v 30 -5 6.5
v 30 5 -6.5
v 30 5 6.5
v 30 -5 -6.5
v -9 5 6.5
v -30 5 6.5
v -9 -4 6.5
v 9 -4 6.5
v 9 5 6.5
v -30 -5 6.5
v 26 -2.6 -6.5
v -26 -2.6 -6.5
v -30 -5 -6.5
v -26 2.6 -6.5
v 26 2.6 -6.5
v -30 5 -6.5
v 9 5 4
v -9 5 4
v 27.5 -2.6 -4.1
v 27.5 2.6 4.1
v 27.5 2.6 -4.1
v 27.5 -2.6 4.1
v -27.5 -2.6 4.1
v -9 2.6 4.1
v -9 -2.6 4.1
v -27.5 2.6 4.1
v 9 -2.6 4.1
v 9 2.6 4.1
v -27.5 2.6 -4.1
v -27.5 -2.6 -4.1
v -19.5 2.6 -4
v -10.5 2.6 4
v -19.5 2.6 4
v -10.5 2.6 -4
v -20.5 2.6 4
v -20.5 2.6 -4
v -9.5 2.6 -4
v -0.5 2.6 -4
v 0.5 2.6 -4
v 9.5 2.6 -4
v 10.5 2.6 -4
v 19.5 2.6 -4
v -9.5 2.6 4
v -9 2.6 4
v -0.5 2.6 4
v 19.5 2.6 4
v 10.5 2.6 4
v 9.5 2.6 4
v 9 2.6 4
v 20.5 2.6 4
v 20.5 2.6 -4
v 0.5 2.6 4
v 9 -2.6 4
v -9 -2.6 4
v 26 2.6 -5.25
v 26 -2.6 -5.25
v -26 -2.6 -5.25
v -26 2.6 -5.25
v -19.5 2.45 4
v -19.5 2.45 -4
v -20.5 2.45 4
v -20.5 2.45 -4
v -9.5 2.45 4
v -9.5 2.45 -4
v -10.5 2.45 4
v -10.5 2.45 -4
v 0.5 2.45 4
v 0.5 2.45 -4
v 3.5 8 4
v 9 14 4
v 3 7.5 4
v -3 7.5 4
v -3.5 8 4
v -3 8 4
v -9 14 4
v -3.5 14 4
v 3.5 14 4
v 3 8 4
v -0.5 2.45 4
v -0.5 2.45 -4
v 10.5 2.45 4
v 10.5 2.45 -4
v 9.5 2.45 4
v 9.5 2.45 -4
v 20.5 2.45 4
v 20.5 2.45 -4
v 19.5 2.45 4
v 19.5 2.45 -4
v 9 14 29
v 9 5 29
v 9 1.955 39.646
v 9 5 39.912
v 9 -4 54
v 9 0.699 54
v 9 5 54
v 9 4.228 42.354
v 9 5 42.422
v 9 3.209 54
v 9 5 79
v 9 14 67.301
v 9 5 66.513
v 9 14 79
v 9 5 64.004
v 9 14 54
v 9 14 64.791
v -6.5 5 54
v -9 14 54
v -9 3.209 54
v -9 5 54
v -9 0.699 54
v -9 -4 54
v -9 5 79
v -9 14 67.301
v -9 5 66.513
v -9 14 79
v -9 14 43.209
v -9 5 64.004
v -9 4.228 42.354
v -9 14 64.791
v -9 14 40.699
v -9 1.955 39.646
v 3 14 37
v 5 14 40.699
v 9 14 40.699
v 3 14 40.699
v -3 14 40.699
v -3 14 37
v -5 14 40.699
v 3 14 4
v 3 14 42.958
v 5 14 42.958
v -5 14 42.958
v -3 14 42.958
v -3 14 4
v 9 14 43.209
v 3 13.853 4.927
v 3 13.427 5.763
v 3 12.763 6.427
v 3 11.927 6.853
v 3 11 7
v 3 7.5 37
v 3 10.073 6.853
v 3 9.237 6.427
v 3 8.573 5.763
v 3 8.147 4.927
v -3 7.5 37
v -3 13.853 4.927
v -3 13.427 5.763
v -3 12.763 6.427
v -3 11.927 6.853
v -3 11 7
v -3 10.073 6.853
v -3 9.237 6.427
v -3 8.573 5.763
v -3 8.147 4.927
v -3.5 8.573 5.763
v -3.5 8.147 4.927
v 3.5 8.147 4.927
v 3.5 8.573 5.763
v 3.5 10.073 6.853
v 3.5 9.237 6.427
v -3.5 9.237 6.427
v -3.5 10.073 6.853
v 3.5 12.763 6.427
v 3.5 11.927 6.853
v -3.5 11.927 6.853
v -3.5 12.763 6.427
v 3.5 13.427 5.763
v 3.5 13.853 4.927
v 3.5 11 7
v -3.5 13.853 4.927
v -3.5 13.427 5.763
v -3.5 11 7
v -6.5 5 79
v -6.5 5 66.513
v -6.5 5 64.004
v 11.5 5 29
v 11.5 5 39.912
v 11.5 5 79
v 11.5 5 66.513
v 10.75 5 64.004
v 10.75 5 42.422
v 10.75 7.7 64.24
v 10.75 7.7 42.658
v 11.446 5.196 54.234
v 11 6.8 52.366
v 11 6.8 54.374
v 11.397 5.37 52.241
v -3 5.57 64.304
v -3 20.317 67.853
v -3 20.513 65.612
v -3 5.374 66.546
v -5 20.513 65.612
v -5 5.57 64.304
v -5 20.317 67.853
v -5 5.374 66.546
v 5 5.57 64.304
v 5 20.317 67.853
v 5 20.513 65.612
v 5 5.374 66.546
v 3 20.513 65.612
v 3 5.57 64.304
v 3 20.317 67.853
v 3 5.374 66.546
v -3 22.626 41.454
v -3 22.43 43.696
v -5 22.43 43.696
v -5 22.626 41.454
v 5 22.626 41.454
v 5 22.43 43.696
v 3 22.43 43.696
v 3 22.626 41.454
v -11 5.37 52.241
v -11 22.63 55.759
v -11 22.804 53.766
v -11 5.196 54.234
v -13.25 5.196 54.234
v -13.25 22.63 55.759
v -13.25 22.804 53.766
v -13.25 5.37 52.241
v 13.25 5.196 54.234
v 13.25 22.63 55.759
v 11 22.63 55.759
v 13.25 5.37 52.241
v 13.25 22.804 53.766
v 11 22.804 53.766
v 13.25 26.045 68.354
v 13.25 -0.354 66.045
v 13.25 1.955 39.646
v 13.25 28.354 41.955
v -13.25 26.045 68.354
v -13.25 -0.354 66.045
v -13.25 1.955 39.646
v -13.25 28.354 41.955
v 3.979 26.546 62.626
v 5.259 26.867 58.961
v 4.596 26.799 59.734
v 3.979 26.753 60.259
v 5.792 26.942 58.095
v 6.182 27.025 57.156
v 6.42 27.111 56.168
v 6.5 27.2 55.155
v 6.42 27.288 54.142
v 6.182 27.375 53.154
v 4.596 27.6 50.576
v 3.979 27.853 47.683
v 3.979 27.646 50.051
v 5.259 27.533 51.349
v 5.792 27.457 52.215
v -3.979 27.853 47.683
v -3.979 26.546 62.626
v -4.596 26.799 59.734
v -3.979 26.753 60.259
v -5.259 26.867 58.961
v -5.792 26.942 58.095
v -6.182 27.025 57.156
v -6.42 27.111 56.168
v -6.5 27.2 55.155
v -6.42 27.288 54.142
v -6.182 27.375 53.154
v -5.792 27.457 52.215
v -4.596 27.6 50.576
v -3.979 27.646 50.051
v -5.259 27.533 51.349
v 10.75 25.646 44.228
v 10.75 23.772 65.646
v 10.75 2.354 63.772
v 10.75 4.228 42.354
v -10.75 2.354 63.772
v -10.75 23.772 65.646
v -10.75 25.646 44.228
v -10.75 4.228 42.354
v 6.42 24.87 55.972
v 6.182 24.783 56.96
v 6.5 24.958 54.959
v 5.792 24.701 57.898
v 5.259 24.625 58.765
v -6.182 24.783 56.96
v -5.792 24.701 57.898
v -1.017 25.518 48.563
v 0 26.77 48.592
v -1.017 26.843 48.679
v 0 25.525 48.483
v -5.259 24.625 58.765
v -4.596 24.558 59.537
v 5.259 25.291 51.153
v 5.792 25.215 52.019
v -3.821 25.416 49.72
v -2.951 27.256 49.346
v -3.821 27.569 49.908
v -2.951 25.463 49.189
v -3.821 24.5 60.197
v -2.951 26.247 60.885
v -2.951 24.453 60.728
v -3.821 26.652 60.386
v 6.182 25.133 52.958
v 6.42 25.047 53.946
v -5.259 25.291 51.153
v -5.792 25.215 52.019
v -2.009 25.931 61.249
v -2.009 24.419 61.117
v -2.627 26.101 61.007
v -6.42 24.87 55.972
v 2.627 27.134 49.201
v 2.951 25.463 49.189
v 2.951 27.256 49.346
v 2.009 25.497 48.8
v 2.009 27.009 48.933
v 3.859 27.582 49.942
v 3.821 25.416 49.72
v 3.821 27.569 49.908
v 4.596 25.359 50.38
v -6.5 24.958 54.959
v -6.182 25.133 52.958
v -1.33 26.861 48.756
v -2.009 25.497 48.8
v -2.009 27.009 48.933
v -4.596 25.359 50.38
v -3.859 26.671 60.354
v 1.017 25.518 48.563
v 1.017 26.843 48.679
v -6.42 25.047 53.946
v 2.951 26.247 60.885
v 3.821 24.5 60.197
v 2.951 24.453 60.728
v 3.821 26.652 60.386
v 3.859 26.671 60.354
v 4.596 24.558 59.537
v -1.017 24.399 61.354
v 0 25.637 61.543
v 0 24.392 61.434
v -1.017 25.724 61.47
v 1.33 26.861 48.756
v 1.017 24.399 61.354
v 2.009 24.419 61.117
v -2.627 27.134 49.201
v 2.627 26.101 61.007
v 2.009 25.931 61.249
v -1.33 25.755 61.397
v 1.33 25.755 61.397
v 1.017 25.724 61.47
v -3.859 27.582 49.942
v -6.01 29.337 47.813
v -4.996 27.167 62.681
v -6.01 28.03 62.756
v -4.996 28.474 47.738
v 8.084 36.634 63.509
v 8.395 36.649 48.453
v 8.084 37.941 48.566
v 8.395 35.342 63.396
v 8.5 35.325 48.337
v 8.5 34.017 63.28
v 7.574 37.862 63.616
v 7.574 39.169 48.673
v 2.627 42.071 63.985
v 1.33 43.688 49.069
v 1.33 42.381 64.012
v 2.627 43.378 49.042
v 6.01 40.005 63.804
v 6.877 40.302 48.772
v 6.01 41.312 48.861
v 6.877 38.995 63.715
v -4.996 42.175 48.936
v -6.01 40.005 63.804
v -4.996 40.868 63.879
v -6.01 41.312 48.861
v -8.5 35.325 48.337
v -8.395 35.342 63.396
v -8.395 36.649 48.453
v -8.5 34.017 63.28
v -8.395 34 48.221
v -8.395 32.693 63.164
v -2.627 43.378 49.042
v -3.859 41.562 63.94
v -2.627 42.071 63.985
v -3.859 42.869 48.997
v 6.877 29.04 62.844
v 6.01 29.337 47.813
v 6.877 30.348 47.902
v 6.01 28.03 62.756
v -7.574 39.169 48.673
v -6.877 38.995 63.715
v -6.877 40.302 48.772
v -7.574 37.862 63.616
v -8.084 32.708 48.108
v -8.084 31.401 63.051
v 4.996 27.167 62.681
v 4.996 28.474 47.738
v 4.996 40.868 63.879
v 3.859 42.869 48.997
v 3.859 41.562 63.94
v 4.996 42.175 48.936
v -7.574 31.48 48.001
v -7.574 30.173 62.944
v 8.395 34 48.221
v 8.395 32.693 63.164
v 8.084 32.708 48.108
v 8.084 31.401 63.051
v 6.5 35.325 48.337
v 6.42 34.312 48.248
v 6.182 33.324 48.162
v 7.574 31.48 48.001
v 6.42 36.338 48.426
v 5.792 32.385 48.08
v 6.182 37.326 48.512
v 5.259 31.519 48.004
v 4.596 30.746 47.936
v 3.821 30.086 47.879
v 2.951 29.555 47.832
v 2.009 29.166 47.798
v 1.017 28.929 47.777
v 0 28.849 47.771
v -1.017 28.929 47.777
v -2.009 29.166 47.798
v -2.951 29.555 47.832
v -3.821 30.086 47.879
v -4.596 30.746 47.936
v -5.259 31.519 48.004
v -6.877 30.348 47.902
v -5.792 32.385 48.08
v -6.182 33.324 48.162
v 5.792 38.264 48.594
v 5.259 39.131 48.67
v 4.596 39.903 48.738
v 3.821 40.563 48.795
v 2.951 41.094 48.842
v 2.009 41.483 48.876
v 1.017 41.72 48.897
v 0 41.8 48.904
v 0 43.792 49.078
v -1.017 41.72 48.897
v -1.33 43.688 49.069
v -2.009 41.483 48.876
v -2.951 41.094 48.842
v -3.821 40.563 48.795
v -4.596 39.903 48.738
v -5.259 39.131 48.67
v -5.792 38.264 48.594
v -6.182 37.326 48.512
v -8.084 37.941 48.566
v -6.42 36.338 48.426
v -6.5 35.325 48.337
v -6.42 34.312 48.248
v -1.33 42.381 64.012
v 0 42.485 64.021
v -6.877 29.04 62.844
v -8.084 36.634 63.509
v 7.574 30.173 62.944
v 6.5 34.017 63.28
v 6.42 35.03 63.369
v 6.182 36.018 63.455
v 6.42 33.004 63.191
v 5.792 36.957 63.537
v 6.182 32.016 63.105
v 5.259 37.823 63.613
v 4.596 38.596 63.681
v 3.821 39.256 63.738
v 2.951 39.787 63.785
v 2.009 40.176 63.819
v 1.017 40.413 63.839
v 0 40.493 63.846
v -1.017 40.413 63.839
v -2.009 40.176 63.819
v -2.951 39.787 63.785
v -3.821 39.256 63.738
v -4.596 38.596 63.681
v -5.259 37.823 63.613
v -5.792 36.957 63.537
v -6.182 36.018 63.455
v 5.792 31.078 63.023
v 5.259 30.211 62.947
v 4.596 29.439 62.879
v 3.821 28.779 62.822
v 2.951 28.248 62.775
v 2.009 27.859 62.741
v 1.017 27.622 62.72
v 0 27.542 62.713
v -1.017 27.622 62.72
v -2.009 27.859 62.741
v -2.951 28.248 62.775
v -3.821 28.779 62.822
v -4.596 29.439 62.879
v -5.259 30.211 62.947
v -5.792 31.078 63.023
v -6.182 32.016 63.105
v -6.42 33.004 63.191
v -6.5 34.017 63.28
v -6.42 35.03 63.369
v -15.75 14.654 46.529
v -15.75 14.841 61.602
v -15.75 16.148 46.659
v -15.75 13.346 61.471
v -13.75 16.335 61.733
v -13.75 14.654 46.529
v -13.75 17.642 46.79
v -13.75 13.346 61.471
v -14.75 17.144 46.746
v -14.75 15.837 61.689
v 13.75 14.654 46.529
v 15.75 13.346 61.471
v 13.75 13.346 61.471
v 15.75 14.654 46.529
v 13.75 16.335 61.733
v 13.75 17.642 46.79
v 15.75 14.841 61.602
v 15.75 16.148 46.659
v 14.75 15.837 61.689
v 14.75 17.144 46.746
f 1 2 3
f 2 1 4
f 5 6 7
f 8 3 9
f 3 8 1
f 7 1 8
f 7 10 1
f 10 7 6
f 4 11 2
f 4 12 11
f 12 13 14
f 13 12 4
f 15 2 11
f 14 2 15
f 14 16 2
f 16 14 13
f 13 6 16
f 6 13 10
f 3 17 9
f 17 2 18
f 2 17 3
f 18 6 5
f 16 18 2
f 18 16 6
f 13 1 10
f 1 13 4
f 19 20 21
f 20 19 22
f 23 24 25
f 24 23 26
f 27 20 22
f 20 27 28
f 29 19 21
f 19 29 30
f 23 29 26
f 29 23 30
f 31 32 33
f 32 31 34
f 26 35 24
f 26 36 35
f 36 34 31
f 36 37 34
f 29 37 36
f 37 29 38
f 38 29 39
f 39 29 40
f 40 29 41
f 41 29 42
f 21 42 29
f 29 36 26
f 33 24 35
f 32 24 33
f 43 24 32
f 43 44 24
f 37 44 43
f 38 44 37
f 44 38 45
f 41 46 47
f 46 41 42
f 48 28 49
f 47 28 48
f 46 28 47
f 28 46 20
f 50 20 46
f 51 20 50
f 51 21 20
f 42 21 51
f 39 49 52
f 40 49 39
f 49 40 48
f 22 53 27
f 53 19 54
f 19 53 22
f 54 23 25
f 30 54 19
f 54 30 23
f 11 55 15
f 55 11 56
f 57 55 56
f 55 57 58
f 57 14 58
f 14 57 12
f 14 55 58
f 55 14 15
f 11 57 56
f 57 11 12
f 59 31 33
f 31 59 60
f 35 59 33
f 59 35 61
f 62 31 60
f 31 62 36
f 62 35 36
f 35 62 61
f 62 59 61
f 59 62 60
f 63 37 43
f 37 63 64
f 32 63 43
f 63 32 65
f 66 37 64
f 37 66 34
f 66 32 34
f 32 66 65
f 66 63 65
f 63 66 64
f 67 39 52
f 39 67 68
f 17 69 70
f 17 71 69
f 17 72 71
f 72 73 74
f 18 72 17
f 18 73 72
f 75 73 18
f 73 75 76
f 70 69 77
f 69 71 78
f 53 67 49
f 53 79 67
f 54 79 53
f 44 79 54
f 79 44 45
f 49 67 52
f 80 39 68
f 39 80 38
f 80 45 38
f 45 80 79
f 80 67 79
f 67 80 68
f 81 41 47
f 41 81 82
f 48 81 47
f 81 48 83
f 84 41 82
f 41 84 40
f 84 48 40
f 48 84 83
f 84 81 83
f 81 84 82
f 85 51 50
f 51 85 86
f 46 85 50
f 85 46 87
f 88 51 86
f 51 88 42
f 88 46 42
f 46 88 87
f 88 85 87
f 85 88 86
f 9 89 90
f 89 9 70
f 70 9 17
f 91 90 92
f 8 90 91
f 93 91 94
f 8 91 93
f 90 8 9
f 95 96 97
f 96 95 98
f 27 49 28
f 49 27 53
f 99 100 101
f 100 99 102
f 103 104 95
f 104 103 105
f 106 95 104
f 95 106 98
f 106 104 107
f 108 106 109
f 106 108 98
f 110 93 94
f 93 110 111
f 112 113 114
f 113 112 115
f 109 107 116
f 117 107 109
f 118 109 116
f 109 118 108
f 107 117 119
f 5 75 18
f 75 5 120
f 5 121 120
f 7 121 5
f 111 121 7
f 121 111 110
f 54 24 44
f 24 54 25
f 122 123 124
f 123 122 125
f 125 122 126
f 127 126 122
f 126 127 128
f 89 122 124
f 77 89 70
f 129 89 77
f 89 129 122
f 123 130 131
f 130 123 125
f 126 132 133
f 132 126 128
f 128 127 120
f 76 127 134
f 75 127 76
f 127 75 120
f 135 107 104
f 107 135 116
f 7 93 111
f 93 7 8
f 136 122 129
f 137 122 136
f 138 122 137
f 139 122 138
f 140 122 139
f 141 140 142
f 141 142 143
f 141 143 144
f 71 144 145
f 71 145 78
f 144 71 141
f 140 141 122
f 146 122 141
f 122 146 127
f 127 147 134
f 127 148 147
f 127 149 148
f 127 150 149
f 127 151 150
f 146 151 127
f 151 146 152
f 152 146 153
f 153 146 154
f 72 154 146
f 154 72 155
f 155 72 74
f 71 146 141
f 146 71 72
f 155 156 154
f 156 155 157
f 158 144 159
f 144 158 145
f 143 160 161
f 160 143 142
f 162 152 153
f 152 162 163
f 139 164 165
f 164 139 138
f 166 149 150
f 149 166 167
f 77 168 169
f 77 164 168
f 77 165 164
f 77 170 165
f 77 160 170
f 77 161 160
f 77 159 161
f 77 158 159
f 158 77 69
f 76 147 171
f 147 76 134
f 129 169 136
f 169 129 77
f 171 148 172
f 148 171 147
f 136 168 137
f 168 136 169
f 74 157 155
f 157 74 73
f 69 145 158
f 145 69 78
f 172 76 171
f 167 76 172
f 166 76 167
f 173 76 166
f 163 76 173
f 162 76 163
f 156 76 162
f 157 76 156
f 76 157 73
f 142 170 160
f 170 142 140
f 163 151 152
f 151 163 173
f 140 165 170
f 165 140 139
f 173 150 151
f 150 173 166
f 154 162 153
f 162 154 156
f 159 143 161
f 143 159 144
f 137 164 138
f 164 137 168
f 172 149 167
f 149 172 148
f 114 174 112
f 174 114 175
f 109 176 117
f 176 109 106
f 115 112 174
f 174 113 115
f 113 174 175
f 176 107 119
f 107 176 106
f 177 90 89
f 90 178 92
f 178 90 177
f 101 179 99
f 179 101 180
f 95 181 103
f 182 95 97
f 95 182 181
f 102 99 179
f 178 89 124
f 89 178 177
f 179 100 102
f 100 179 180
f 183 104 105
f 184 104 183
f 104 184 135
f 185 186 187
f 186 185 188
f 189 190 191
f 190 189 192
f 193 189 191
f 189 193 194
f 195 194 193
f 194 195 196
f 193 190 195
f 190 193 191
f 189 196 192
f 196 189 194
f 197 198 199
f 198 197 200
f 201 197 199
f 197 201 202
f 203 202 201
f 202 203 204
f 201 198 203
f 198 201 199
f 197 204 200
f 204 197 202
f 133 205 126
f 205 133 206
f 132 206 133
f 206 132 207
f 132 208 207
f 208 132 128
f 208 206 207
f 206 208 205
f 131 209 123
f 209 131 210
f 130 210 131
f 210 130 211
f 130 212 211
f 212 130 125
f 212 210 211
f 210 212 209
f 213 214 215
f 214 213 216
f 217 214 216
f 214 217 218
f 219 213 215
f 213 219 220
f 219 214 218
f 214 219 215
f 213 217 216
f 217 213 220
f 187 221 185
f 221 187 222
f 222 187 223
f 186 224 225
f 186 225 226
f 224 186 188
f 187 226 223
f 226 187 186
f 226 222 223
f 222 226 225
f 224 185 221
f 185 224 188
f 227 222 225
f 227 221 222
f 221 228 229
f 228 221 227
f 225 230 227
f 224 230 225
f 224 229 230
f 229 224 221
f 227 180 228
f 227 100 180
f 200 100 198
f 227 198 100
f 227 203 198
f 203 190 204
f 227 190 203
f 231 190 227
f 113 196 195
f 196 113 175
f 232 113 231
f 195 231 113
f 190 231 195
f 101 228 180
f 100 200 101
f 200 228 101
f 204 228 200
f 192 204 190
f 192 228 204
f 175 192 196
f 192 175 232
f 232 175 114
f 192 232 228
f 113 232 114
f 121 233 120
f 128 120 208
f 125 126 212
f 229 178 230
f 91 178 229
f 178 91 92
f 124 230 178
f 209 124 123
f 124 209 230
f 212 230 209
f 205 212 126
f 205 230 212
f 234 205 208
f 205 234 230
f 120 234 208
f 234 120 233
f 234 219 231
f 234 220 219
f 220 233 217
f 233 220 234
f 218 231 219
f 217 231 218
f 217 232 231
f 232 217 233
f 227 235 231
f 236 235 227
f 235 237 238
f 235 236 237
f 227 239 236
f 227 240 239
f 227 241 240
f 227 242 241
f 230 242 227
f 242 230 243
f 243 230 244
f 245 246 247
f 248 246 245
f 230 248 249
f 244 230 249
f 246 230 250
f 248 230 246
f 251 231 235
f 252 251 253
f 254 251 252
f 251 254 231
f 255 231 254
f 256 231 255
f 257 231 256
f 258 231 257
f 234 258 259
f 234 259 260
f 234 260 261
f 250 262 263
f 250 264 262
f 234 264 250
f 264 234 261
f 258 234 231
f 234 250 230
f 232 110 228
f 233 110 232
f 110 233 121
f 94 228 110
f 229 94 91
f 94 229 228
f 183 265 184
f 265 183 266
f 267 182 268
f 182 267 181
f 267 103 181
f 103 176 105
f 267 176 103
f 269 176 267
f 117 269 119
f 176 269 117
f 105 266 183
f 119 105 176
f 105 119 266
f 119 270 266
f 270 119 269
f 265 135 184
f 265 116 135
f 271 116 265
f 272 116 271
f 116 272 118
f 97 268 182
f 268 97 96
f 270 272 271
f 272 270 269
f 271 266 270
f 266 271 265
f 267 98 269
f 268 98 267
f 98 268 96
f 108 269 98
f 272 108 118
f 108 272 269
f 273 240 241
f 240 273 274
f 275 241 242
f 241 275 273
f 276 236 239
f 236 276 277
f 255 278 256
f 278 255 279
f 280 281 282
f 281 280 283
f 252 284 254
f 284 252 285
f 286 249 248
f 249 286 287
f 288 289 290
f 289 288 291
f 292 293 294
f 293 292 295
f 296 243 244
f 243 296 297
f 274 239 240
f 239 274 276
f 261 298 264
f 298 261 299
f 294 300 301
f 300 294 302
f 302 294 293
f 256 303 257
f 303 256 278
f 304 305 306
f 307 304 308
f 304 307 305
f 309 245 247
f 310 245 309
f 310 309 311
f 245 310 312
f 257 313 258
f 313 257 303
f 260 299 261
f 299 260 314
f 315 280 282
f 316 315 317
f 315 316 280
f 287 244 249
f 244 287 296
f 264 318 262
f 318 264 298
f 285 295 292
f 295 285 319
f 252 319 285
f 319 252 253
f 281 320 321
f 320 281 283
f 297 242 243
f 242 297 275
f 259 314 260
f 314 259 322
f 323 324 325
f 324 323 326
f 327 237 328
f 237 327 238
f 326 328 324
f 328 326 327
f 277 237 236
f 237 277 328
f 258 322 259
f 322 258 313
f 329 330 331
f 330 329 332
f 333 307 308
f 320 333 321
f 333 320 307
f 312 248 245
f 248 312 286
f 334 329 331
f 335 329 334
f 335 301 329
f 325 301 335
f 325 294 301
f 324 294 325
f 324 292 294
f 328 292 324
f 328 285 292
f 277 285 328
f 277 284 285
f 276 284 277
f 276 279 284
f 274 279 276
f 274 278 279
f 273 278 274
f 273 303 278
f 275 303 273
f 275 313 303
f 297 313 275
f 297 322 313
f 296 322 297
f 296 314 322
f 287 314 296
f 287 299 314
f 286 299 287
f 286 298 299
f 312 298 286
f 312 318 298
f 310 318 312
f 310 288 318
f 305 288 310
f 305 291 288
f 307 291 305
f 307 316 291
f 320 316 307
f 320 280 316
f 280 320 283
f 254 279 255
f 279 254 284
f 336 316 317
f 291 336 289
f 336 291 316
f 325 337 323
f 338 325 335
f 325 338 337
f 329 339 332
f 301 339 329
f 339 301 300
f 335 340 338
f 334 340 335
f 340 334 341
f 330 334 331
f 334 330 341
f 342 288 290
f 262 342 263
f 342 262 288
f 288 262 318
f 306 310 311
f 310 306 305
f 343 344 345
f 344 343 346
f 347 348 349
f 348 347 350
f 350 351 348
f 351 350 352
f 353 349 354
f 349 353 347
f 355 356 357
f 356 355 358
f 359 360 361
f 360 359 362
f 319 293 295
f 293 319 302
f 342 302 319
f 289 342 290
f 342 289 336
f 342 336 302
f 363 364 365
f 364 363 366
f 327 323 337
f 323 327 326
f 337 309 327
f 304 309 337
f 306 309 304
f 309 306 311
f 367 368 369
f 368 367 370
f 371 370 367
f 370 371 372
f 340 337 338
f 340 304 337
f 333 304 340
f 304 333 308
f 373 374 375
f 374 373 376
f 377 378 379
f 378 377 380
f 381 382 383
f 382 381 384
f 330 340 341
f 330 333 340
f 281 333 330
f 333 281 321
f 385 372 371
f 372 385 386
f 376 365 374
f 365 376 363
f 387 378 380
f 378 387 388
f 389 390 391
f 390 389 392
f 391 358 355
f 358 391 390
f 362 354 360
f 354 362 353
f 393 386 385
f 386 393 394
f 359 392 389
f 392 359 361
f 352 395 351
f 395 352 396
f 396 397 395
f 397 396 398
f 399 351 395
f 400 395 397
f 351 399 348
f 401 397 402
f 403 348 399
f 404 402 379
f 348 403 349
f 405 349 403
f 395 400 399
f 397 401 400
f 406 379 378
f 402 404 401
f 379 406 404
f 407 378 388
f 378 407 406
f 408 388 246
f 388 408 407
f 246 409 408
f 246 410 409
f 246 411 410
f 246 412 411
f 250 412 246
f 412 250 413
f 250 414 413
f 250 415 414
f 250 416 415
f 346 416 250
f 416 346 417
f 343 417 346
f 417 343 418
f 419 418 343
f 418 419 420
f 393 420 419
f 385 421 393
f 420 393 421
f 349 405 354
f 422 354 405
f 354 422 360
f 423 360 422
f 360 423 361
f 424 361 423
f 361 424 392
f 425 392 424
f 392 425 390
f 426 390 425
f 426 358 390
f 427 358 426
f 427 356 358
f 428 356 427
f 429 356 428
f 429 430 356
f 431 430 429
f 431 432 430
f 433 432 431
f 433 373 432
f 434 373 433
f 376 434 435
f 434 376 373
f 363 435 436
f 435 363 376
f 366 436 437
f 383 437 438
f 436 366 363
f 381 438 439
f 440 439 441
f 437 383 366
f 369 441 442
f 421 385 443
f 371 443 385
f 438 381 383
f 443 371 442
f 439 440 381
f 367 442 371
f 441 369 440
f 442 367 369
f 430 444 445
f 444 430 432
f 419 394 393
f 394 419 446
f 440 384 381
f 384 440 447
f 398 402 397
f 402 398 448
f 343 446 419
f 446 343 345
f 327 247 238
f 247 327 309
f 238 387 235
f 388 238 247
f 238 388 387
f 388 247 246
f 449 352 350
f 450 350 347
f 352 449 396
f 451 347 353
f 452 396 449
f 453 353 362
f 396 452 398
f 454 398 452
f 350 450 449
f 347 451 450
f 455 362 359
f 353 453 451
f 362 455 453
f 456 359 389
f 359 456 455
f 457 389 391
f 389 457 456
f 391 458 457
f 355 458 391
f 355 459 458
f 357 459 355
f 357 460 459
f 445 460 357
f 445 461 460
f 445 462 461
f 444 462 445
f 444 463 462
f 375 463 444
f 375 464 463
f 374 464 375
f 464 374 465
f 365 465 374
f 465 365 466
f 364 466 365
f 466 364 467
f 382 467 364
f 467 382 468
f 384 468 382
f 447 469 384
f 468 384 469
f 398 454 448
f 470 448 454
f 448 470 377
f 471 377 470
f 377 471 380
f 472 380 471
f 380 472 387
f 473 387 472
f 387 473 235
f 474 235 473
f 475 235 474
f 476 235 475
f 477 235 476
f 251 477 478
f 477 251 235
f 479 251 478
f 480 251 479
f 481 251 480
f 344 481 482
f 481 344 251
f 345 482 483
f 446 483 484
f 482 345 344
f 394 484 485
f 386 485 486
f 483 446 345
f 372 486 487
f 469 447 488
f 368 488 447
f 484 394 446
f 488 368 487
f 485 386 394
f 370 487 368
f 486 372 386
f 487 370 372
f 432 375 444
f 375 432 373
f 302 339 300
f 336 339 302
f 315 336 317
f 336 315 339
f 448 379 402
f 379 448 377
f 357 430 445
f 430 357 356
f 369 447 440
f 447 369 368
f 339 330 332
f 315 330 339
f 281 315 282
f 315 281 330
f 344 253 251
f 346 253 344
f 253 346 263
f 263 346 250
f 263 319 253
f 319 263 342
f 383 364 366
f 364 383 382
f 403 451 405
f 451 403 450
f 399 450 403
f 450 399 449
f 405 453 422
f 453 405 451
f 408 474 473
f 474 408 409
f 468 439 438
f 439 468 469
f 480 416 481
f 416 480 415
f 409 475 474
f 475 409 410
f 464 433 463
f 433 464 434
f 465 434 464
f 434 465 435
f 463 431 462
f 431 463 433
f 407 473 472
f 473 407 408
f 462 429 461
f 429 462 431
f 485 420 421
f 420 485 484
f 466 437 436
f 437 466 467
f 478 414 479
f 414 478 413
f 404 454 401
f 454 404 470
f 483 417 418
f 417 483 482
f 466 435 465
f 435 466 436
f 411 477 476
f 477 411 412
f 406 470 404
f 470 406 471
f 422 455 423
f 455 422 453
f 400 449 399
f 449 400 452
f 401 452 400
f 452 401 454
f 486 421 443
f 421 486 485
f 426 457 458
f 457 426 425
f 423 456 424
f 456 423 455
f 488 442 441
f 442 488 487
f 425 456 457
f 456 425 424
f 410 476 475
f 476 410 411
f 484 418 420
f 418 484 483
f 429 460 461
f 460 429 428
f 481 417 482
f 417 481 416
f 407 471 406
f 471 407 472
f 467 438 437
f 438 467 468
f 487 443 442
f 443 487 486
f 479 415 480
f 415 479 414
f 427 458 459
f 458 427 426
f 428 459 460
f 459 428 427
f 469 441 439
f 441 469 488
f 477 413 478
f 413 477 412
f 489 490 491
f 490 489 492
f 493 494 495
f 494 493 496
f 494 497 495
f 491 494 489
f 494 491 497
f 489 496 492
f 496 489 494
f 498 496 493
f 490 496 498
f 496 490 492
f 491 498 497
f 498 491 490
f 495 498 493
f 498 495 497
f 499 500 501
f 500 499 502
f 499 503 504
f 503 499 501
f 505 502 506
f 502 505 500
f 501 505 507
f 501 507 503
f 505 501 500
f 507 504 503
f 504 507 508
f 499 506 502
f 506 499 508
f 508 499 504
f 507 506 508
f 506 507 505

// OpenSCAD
/*
 * Google Glass EE2 + FLIR Boson 320 Mount
 * Parametric OpenSCAD design
 * 
 * This design creates a top-mount bracket that attaches to the Glass frame
 * and holds the Boson 320 thermal camera with lens
 */

// ==============================
// PARAMETERS - Adjust these as needed
// ==============================

// Boson 320 Core dimensions
boson_body_size = 21;  // 21mm cube
boson_tolerance = 0.5;  // Clearance around Boson
boson_lens_diameter = 12;  // Diameter of your lens (adjust based on actual)
boson_lens_length = 15;  // Length your lens protrudes

// Glass frame dimensions (measure your actual device)
frame_thickness = 5;  // Thickness of Glass brow bar
frame_width = 60;  // Width of mounting area
frame_height = 8;  // Height of frame bar

// Mount design parameters
wall_thickness = 2.5;  // Wall thickness for strength
arm_length = 50;  // Height from frame to camera
arm_width = 18;  // Width of support arm
cable_channel_width = 6;  // Width for USB-C cable
tilt_angle = 5;  // Downward angle in degrees

// Ventilation
vent_slot_width = 2;
vent_slot_length = 15;
vent_spacing = 4;

// ==============================
// CALCULATED VALUES
// ==============================

boson_cavity_size = boson_body_size + boson_tolerance;
lens_opening_radius = boson_lens_diameter / 2 + 0.5;

// ==============================
// MAIN ASSEMBLY
// ==============================

module complete_mount() {
    union() {
        // Frame clamp (bottom)
        translate([0, 0, 0])
            frame_clamp();
        
        // Support arm (middle)
        translate([0, frame_thickness/2 + wall_thickness, frame_height/2])
            support_arm();
        
        // Boson cage (top)
        translate([0, frame_thickness/2 + wall_thickness + arm_width/2, arm_length + frame_height/2])
            rotate([tilt_angle, 0, 0])
                boson_cage();
    }
}

// ==============================
// COMPONENTS
// ==============================

module frame_clamp() {
    /*
     * C-shaped clamp that wraps around Glass frame
     * Snap-fit design for easy installation/removal
     */
    
    difference() {
        // Outer shell
        cube([frame_width, frame_thickness + 2*wall_thickness, frame_height + 2*wall_thickness], center=true);
        
        // Frame cavity (slightly oversized for fit)
        cube([frame_width - 2*wall_thickness, frame_thickness + 0.2, frame_height + 0.2], center=true);
        
        // Opening at bottom for snap-fit
        translate([0, 0, -(frame_height + 2*wall_thickness)/2 - 0.5])
            cube([frame_width - 8, frame_thickness + 0.2, wall_thickness + 1], center=true);
    }
    
    // Add grip ridges inside for friction
    for (i = [-2:2]) {
        translate([i * 10, frame_thickness/2 + 0.1, 0])
            cube([1, 0.3, frame_height], center=true);
    }
}

module support_arm() {
    /*
     * Vertical arm connecting frame clamp to camera cage
     * Includes cable channel for USB-C routing
     */
    
    difference() {
        // Main arm body
        translate([0, 0, arm_length/2])
            cube([arm_width, arm_width, arm_length], center=true);
        
        // Cable channel (runs up the back)
        translate([0, arm_width/2 - cable_channel_width/2, cable_channel_width/2])
            cube([cable_channel_width, cable_channel_width + 1, arm_length + 10], center=true);
        
        // Strain relief curve at bottom
        translate([0, arm_width/2 - cable_channel_width/2, 0])
            rotate([0, 90, 0])
                cylinder(h=cable_channel_width + 1, r=3, center=true, $fn=20);
    }
    
    // Reinforcement ribs on sides
    for (side = [-1, 1]) {
        translate([side * arm_width/2, 0, arm_length/2])
            rotate([0, 0, 0])
                linear_extrude(height=arm_length)
                    polygon([[0, 0], [0, arm_width/2], [wall_thickness, 0]]);
    }
}

module boson_cage() {
    /*
     * Cage that holds Boson 320 securely
     * Includes lens opening, ventilation, and spring clip retention
     */
    
    difference() {
        // Outer shell
        cube([boson_cavity_size + 2*wall_thickness, 
              boson_cavity_size + 2*wall_thickness, 
              boson_cavity_size + 2*wall_thickness], 
             center=true);
        
        // Boson cavity
        cube([boson_cavity_size, boson_cavity_size, boson_cavity_size], center=true);
        
        // Front opening for lens
        translate([0, (boson_cavity_size + 2*wall_thickness)/2, 0])
            rotate([90, 0, 0])
                cylinder(h=wall_thickness + 2, r=lens_opening_radius, center=true, $fn=40);
        
        // Back opening for USB-C connector
        translate([0, -(boson_cavity_size + 2*wall_thickness)/2, -boson_cavity_size/4])
            cube([10, wall_thickness + 2, 6], center=true);
        
        // Top ventilation slots
        for (i = [-1, 1]) {
            translate([i * vent_spacing, 0, (boson_cavity_size + 2*wall_thickness)/2])
                cube([vent_slot_width, vent_slot_length, wall_thickness + 2], center=true);
        }
        
        // Bottom ventilation slots  
        for (i = [-1, 1]) {
            translate([i * vent_spacing, 0, -(boson_cavity_size + 2*wall_thickness)/2])
                cube([vent_slot_width, vent_slot_length, wall_thickness + 2], center=true);
        }
        
        // Side access slots for spring clips
        for (side = [-1, 1]) {
            translate([side * (boson_cavity_size + 2*wall_thickness)/2, 0, 0])
                cube([wall_thickness + 2, boson_cavity_size - 4, 2], center=true);
        }
    }
    
    // Lens hood (extends forward)
    translate([0, (boson_cavity_size + 2*wall_thickness)/2 + boson_lens_length/2, 0])
        difference() {
            cylinder(h=boson_lens_length, r=lens_opening_radius + 2, center=true, $fn=40);
            cylinder(h=boson_lens_length + 2, r=lens_opening_radius, center=true, $fn=40);
        }
    
    // Spring clip retention features (flexible tabs)
    for (side = [-1, 1]) {
        translate([side * (boson_cavity_size/2 + wall_thickness + 0.5), 0, 0])
            spring_clip(side);
    }
}

module spring_clip(side) {
    /*
     * Flexible retention clip for holding Boson
     * Print these in a flexible orientation for springiness
     */
    
    linear_extrude(height=15, center=true)
        polygon([
            [side * 0, 0],
            [side * 0, 3],
            [side * 1, 2.5],
            [side * 2, 1.5],
            [side * 2, 0]
        ]);
}

// ==============================
// CABLE MANAGEMENT ACCESSORIES
// ==============================

module cable_clip() {
    /*
     * Small clip for routing cable along arm
     * Print several of these
     */
    
    difference() {
        union() {
            // Base
            cube([10, 8, 2], center=true);
            // Clip arc
            translate([0, 0, 1])
                rotate([0, 0, 0])
                    difference() {
                        cylinder(h=6, r=4, center=true, $fn=30);
                        cylinder(h=7, r=3, center=true, $fn=30);
                        translate([0, -5, 0])
                            cube([10, 10, 10], center=true);
                    }
        }
        // Mounting hole
        cylinder(h=5, r=1.5, center=true, $fn=20);
    }
}

// ==============================
// RENDERING
// ==============================

// Render the complete mount
complete_mount();

// Optionally render cable clips separately
// Uncomment to generate clips for printing:
// for (i = [0:3]) {
//     translate([0, -50 - i*20, 0])
//         cable_clip();
// }

// ==============================
// PRINT INSTRUCTIONS
// ==============================

/*
 * RECOMMENDED PRINT SETTINGS:
 * 
 * Material: PETG (best for this application)
 *   - Layer height: 0.2mm
 *   - Wall thickness: 4 perimeters
 *   - Infill: 30% gyroid
 *   - Print temperature: 230-240°C
 *   - Bed temperature: 70-80°C
 * 
 * Alternative: ABS (stronger, harder to print)
 * Alternative: PLA (easiest, but less durable)
 * 
 * For frame contact surfaces: Add TPU pads after printing
 * 
 * ORIENTATION:
 * - Print with frame clamp on build plate
 * - Boson cage should be upright
 * - Minimal supports should be needed if designed correctly
 * 
 * POST-PROCESSING:
 * - Test fit on Glass frame before assembling Boson
 * - Sand any rough edges
 * - Add thin rubber/silicone pads to frame contact points
 * - Consider painting with heat-resistant paint
 */

// ==============================
// CUSTOMIZATION NOTES
// ==============================

/*
 * TO CUSTOMIZE FOR YOUR SETUP:
 * 
 * 1. Measure your Glass frame precisely with calipers:
 *    - Update frame_thickness, frame_width, frame_height
 * 
 * 2. Measure your specific lens:
 *    - Update boson_lens_diameter and boson_lens_length
 * 
 * 3. Adjust mounting position:
 *    - Change arm_length to raise/lower camera
 *    - Change tilt_angle for camera angle
 * 
 * 4. Test fit with cardboard prototype first!
 * 
 * 5. Print iteratively:
 *    - Start with just frame_clamp() to test fit
 *    - Then add arm
 *    - Finally add cage
 * 
 * FUTURE ENHANCEMENTS:
 * - Add hinge for tilt adjustment
 * - Add quick-release mechanism
 * - Add second camera mount for visual camera
 */
